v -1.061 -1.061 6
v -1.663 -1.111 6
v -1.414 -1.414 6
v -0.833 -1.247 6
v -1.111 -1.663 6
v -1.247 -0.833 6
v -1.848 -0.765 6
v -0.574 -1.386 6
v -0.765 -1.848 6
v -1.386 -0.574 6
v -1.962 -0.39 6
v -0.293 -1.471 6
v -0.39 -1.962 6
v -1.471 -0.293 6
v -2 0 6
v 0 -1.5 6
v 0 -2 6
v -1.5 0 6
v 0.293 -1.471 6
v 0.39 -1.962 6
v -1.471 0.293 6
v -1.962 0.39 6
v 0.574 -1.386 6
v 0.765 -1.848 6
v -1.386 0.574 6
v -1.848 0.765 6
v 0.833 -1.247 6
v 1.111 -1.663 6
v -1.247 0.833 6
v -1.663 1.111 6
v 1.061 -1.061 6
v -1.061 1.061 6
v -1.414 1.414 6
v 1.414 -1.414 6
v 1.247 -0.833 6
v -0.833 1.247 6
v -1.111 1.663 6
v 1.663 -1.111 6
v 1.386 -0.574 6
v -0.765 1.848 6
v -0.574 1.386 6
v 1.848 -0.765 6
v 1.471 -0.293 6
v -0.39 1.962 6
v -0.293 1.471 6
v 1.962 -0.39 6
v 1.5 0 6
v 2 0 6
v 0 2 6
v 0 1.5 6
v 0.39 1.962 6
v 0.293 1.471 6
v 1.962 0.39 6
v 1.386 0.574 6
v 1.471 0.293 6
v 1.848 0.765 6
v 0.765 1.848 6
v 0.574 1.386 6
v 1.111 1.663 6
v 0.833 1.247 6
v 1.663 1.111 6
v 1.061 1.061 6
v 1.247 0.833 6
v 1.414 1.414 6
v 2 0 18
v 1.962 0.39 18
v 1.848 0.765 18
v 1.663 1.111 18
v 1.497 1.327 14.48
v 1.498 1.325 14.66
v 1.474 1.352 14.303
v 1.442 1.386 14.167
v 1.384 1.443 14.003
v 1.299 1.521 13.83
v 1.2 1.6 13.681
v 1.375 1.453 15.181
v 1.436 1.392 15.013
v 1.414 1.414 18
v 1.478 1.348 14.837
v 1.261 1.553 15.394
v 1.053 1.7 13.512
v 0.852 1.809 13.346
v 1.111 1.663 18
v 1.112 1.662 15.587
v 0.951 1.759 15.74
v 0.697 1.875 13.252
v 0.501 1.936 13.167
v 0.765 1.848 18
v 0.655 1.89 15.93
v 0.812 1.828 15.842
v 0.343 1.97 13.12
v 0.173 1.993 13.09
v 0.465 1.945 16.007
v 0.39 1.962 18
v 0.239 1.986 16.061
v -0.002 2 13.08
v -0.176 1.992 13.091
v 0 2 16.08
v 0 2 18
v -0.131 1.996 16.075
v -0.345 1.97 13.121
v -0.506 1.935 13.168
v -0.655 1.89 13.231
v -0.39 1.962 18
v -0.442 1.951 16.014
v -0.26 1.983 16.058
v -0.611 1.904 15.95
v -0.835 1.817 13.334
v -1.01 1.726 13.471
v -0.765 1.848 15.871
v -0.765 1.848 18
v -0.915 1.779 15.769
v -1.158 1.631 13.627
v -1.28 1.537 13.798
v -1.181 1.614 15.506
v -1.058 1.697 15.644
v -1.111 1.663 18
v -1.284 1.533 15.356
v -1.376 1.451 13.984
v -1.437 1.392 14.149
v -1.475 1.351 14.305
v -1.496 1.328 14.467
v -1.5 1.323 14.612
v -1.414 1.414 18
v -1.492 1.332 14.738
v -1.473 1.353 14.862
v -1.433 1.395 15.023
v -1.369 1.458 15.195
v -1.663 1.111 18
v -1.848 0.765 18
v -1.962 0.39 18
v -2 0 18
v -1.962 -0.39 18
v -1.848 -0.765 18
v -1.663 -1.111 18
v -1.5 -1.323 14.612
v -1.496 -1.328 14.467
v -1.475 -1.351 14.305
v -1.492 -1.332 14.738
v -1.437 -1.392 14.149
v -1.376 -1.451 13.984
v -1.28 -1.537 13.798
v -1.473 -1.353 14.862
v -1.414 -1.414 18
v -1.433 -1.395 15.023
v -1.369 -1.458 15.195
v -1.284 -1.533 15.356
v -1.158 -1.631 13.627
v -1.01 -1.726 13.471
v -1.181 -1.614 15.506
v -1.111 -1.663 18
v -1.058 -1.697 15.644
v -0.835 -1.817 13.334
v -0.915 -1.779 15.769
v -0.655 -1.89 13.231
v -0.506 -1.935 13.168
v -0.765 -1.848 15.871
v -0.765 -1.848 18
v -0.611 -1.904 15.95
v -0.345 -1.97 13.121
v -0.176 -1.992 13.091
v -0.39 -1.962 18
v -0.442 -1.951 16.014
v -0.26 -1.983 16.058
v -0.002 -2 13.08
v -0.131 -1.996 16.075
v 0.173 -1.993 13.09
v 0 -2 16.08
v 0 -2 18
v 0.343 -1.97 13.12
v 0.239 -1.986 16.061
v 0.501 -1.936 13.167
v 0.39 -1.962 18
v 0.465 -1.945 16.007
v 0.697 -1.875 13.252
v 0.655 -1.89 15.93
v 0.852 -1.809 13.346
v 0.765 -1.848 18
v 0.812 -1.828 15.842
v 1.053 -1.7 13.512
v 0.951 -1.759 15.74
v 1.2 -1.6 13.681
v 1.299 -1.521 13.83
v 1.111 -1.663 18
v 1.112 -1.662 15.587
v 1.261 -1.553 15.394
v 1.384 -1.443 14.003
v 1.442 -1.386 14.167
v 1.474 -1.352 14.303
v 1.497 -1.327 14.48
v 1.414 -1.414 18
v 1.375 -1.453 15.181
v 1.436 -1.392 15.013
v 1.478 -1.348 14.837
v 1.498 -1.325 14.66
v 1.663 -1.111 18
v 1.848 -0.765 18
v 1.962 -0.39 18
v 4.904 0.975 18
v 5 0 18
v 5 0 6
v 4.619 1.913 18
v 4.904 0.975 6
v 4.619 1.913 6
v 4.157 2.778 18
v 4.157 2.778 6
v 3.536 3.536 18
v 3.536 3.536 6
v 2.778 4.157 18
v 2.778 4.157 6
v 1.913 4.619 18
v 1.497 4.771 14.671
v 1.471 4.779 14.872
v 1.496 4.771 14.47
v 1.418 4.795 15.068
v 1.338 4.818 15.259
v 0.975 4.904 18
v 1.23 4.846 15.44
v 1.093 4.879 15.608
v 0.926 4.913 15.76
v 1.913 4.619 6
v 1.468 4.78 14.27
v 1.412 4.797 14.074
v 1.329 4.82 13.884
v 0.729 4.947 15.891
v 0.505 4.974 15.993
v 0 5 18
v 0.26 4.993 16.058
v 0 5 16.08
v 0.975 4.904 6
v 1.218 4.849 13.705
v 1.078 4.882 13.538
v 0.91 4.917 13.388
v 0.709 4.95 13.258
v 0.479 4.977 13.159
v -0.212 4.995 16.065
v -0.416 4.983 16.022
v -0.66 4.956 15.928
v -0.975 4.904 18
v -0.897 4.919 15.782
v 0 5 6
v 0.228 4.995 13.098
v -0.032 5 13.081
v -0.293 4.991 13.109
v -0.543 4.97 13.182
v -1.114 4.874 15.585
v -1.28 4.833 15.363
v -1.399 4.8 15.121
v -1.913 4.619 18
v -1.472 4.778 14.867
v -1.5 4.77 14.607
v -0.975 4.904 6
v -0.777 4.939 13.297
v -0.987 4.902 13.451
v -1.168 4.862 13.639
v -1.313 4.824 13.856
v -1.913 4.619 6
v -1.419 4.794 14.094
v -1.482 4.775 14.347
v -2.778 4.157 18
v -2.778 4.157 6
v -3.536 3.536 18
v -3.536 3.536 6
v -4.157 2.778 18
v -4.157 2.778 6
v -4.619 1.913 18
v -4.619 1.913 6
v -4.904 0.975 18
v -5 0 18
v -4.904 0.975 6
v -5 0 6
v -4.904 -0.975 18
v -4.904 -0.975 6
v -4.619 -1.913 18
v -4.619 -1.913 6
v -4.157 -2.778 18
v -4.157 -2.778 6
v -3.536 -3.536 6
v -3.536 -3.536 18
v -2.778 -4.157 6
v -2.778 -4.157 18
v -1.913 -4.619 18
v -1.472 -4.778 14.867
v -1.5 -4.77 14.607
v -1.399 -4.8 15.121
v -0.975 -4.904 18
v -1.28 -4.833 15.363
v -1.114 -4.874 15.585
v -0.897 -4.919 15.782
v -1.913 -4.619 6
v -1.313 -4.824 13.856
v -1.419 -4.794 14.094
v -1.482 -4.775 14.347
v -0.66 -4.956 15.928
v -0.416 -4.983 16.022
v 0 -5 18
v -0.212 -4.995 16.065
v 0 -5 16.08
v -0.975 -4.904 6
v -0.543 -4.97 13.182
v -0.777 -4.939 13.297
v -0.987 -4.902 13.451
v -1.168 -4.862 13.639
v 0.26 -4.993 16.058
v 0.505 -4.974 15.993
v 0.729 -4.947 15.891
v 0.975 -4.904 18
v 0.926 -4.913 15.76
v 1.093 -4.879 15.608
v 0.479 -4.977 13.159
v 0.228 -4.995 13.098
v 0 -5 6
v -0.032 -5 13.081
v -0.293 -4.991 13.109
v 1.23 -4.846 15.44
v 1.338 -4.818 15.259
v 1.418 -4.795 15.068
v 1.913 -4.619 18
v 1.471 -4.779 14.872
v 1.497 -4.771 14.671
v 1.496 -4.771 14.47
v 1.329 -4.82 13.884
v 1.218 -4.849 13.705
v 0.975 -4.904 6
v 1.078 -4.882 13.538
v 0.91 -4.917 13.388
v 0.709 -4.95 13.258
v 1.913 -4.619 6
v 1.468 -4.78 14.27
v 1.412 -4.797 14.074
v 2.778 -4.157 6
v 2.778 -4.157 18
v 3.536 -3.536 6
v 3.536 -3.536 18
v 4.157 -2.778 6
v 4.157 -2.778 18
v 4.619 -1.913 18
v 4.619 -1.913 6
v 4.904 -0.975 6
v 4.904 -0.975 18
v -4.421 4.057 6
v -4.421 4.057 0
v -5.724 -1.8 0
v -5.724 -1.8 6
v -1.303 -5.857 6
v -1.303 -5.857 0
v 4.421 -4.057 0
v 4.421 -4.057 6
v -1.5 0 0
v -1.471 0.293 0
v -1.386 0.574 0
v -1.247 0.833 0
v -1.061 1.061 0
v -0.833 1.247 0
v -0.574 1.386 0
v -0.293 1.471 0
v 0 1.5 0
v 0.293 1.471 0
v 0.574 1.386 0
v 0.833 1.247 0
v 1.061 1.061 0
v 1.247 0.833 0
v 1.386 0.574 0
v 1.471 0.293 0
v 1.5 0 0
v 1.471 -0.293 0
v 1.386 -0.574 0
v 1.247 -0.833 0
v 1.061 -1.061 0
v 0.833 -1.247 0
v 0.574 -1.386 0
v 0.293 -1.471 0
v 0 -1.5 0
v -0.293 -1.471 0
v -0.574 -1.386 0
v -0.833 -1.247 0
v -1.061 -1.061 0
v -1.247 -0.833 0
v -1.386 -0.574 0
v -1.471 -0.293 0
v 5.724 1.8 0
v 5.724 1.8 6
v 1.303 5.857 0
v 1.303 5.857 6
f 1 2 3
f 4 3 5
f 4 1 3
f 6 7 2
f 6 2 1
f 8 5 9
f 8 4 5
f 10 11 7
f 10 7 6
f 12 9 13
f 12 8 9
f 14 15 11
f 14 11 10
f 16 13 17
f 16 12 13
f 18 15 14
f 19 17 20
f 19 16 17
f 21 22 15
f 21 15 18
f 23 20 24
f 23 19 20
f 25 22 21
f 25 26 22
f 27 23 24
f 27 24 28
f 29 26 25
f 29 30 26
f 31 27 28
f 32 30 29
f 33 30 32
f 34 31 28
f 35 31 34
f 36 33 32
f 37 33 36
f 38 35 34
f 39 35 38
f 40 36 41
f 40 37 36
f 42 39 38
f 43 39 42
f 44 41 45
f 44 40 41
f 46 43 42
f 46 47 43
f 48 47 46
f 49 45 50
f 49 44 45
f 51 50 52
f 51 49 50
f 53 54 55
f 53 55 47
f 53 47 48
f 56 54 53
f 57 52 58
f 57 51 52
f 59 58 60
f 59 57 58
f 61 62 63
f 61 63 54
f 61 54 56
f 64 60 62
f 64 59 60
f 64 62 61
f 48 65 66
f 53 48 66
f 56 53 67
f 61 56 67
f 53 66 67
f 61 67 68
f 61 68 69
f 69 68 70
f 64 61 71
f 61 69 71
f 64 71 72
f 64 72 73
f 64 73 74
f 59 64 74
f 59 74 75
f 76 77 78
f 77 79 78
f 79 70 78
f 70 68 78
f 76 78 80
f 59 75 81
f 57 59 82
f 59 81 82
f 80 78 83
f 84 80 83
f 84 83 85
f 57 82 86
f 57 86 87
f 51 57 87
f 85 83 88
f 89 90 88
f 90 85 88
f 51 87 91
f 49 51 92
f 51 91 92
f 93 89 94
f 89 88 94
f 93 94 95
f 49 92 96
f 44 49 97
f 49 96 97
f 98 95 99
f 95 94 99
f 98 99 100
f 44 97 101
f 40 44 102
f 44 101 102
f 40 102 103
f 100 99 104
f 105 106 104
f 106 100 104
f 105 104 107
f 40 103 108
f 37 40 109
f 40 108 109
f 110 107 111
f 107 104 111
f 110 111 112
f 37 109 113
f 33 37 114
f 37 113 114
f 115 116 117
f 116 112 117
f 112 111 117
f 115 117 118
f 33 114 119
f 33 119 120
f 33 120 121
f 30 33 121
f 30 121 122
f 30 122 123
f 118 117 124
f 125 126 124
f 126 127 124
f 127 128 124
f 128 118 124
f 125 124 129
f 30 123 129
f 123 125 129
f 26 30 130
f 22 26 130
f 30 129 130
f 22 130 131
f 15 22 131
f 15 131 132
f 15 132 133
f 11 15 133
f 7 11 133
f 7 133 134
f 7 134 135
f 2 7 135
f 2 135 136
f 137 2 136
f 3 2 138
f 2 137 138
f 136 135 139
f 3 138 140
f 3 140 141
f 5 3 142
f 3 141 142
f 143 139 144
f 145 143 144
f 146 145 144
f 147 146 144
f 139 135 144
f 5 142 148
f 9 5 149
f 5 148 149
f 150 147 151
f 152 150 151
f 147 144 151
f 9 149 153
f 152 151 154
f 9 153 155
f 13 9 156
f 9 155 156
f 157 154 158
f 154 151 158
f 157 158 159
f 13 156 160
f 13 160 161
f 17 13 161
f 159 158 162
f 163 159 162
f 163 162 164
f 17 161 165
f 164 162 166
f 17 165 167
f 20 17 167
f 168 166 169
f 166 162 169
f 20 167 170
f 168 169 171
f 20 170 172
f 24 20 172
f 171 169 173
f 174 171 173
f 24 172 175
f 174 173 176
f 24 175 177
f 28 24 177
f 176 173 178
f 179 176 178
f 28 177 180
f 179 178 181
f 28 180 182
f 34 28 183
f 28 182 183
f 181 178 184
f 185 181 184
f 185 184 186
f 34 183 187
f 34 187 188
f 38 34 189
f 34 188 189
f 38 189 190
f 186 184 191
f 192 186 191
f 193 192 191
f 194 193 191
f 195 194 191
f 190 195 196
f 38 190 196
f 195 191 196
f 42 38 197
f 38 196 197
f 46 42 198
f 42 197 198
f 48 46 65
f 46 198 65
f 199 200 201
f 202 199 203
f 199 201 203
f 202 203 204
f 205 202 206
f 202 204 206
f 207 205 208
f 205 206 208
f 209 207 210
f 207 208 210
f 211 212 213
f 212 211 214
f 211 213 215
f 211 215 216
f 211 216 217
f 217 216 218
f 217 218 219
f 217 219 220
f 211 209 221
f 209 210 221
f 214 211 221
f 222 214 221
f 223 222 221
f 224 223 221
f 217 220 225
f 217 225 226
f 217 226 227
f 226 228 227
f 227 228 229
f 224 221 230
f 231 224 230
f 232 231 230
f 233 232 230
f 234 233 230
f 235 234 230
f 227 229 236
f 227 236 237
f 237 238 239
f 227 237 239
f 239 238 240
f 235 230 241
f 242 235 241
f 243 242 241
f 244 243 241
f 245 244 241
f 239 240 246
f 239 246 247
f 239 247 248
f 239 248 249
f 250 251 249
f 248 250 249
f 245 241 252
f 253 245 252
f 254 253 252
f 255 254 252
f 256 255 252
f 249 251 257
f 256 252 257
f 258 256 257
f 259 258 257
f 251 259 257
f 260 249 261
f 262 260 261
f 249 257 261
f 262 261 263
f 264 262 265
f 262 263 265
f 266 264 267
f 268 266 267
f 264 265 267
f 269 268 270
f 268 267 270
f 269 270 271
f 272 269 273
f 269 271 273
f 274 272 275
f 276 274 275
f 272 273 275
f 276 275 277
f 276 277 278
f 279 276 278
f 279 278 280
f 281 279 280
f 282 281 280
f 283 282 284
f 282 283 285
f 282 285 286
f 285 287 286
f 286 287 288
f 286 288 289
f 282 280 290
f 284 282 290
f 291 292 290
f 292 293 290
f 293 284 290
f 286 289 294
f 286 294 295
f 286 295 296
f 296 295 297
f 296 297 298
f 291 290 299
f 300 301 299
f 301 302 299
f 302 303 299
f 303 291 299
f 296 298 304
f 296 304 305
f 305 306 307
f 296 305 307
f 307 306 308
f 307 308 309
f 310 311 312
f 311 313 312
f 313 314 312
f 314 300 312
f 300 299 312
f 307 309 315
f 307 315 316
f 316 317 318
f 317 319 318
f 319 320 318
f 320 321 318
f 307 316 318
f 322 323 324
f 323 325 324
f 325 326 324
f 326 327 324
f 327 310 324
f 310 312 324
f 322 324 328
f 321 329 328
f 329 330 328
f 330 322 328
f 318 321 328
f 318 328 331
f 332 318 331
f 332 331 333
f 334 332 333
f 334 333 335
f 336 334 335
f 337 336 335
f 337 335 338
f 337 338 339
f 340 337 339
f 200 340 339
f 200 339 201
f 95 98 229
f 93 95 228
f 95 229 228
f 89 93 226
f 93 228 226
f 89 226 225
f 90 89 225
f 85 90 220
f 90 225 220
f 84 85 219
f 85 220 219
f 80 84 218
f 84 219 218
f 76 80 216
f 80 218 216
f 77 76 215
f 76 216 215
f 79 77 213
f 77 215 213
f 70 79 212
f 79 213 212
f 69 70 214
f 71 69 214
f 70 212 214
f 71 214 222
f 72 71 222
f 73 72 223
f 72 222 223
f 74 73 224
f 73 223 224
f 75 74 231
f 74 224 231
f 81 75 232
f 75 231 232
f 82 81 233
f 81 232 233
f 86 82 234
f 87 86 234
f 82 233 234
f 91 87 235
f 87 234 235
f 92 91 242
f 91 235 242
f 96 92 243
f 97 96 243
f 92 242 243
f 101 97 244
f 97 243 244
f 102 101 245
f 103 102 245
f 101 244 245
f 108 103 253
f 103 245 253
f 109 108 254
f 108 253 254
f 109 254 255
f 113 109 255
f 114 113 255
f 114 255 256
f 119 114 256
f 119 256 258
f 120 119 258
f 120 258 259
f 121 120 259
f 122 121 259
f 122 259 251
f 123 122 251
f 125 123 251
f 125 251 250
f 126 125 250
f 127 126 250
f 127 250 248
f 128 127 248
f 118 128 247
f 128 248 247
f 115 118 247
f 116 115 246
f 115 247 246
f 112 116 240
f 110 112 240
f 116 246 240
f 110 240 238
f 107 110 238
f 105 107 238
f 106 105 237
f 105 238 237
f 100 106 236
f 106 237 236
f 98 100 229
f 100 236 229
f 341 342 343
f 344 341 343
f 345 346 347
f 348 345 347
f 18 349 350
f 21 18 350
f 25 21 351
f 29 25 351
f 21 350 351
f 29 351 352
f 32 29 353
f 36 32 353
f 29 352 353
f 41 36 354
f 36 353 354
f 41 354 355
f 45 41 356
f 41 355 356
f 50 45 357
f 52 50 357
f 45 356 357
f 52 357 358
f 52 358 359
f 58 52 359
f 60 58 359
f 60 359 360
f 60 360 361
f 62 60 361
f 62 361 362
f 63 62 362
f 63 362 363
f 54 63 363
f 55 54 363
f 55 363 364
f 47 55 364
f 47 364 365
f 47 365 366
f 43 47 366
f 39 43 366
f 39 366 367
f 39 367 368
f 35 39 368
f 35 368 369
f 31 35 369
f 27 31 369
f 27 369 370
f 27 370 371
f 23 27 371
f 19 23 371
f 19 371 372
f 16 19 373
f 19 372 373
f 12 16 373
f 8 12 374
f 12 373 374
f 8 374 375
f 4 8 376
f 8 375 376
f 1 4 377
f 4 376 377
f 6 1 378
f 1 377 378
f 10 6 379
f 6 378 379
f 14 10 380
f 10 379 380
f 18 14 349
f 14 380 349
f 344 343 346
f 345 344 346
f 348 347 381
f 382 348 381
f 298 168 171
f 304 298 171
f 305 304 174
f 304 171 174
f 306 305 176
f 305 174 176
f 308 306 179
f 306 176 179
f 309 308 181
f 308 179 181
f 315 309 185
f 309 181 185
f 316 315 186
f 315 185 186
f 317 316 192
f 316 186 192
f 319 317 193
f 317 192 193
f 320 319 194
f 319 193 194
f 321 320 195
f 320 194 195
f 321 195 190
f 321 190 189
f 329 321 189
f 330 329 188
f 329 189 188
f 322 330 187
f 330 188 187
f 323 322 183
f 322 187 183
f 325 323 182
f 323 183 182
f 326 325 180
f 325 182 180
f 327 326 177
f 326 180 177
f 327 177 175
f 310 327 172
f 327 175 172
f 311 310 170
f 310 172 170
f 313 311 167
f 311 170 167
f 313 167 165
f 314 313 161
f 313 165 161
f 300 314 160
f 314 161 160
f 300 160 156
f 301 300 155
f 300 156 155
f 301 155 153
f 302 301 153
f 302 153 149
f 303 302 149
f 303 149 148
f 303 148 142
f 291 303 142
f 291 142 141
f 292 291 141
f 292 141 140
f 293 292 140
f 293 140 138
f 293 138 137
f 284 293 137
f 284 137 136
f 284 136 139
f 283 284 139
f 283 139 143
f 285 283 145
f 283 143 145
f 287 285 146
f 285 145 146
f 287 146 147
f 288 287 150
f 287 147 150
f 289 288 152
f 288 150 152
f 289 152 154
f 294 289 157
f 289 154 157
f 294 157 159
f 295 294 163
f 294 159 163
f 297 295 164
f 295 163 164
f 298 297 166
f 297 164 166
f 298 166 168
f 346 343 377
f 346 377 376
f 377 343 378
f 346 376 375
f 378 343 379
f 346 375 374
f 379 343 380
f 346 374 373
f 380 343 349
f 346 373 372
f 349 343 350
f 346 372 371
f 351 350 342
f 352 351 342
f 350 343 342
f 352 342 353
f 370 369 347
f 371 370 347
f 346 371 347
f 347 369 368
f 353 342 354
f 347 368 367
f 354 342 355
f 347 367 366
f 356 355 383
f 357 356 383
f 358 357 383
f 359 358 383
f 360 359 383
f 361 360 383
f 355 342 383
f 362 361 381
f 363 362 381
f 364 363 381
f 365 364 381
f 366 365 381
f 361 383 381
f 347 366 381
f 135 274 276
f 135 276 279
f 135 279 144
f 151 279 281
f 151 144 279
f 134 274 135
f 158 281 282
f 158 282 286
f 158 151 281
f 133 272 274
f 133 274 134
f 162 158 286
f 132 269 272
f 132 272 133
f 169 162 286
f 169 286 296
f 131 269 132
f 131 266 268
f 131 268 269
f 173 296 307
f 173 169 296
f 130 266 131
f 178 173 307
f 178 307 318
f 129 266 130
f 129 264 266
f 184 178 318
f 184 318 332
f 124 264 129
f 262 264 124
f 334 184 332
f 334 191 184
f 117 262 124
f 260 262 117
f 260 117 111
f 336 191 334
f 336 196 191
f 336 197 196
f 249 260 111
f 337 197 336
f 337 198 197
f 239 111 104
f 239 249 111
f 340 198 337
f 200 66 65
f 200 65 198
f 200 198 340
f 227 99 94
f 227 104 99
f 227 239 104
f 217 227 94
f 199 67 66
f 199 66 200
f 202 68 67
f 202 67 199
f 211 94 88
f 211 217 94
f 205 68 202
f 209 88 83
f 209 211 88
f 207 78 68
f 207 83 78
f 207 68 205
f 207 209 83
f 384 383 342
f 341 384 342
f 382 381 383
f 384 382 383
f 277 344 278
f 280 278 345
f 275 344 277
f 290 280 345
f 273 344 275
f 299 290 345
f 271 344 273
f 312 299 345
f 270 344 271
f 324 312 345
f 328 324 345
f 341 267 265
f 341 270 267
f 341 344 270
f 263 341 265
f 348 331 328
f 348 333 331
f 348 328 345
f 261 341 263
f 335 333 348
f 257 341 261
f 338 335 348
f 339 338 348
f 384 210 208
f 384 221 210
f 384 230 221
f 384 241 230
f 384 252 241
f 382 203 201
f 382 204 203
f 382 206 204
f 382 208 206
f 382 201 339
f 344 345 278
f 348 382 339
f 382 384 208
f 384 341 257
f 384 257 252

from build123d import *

# Parameters (mm, degrees)
BOSS_EXTRUDE2_DEPTH = 6
SKETCH4_R           = 5
BOSS_EXTRUDE3_DEPTH = 12
SKETCH5_R           = 1.5
CUT_EXTRUDE1_DEPTH  = 6
SKETCH6_R           = 2
CUT_EXTRUDE2_DEPTH  = 12
SKETCH7_R           = 1.5
CUT_EXTRUDE3_DEPTH  = 10


with BuildPart() as part:
    # Sketch3 → Boss-Extrude2 (new body)
    with BuildSketch(Plane.XY):
        Polygon((-4.420907708, 4.056547182), (-5.723526765, -1.800344791), (-1.302619058, -5.856891974), (4.420907708, -4.056547182), (5.723526765, 1.800344791), (1.302619058, 5.856891974), align=None)
    extrude(amount=BOSS_EXTRUDE2_DEPTH)

    # Sketch4 → Boss-Extrude3 (add)
    with BuildSketch(Plane.XY.offset(6)):
        Circle(SKETCH4_R)
    extrude(amount=BOSS_EXTRUDE3_DEPTH)

    # Sketch5 → Cut-Extrude1 (cut, symmetric)
    with BuildSketch(Plane(origin=(0, 0, 0), x_dir=(1, 0, 0), z_dir=(0, 1, 0))):
        with Locations(Location((0, -14.580477712, 0), (0, 0, 270))):
            Circle(SKETCH5_R)
    extrude(amount=CUT_EXTRUDE1_DEPTH, both=True, mode=Mode.SUBTRACT)

    # Sketch6 → Cut-Extrude2 (cut)
    with BuildSketch(Plane.XY.offset(18)):
        Circle(SKETCH6_R)
    extrude(amount=-CUT_EXTRUDE2_DEPTH, mode=Mode.SUBTRACT)

    # Sketch7 → Cut-Extrude3 (cut)
    with BuildSketch(Plane(origin=(0, 0, 0), x_dir=(-1, 0, 0), z_dir=(0, 0, -1))):
        Circle(SKETCH7_R)
    extrude(amount=-CUT_EXTRUDE3_DEPTH, mode=Mode.SUBTRACT)


solid = part.part
